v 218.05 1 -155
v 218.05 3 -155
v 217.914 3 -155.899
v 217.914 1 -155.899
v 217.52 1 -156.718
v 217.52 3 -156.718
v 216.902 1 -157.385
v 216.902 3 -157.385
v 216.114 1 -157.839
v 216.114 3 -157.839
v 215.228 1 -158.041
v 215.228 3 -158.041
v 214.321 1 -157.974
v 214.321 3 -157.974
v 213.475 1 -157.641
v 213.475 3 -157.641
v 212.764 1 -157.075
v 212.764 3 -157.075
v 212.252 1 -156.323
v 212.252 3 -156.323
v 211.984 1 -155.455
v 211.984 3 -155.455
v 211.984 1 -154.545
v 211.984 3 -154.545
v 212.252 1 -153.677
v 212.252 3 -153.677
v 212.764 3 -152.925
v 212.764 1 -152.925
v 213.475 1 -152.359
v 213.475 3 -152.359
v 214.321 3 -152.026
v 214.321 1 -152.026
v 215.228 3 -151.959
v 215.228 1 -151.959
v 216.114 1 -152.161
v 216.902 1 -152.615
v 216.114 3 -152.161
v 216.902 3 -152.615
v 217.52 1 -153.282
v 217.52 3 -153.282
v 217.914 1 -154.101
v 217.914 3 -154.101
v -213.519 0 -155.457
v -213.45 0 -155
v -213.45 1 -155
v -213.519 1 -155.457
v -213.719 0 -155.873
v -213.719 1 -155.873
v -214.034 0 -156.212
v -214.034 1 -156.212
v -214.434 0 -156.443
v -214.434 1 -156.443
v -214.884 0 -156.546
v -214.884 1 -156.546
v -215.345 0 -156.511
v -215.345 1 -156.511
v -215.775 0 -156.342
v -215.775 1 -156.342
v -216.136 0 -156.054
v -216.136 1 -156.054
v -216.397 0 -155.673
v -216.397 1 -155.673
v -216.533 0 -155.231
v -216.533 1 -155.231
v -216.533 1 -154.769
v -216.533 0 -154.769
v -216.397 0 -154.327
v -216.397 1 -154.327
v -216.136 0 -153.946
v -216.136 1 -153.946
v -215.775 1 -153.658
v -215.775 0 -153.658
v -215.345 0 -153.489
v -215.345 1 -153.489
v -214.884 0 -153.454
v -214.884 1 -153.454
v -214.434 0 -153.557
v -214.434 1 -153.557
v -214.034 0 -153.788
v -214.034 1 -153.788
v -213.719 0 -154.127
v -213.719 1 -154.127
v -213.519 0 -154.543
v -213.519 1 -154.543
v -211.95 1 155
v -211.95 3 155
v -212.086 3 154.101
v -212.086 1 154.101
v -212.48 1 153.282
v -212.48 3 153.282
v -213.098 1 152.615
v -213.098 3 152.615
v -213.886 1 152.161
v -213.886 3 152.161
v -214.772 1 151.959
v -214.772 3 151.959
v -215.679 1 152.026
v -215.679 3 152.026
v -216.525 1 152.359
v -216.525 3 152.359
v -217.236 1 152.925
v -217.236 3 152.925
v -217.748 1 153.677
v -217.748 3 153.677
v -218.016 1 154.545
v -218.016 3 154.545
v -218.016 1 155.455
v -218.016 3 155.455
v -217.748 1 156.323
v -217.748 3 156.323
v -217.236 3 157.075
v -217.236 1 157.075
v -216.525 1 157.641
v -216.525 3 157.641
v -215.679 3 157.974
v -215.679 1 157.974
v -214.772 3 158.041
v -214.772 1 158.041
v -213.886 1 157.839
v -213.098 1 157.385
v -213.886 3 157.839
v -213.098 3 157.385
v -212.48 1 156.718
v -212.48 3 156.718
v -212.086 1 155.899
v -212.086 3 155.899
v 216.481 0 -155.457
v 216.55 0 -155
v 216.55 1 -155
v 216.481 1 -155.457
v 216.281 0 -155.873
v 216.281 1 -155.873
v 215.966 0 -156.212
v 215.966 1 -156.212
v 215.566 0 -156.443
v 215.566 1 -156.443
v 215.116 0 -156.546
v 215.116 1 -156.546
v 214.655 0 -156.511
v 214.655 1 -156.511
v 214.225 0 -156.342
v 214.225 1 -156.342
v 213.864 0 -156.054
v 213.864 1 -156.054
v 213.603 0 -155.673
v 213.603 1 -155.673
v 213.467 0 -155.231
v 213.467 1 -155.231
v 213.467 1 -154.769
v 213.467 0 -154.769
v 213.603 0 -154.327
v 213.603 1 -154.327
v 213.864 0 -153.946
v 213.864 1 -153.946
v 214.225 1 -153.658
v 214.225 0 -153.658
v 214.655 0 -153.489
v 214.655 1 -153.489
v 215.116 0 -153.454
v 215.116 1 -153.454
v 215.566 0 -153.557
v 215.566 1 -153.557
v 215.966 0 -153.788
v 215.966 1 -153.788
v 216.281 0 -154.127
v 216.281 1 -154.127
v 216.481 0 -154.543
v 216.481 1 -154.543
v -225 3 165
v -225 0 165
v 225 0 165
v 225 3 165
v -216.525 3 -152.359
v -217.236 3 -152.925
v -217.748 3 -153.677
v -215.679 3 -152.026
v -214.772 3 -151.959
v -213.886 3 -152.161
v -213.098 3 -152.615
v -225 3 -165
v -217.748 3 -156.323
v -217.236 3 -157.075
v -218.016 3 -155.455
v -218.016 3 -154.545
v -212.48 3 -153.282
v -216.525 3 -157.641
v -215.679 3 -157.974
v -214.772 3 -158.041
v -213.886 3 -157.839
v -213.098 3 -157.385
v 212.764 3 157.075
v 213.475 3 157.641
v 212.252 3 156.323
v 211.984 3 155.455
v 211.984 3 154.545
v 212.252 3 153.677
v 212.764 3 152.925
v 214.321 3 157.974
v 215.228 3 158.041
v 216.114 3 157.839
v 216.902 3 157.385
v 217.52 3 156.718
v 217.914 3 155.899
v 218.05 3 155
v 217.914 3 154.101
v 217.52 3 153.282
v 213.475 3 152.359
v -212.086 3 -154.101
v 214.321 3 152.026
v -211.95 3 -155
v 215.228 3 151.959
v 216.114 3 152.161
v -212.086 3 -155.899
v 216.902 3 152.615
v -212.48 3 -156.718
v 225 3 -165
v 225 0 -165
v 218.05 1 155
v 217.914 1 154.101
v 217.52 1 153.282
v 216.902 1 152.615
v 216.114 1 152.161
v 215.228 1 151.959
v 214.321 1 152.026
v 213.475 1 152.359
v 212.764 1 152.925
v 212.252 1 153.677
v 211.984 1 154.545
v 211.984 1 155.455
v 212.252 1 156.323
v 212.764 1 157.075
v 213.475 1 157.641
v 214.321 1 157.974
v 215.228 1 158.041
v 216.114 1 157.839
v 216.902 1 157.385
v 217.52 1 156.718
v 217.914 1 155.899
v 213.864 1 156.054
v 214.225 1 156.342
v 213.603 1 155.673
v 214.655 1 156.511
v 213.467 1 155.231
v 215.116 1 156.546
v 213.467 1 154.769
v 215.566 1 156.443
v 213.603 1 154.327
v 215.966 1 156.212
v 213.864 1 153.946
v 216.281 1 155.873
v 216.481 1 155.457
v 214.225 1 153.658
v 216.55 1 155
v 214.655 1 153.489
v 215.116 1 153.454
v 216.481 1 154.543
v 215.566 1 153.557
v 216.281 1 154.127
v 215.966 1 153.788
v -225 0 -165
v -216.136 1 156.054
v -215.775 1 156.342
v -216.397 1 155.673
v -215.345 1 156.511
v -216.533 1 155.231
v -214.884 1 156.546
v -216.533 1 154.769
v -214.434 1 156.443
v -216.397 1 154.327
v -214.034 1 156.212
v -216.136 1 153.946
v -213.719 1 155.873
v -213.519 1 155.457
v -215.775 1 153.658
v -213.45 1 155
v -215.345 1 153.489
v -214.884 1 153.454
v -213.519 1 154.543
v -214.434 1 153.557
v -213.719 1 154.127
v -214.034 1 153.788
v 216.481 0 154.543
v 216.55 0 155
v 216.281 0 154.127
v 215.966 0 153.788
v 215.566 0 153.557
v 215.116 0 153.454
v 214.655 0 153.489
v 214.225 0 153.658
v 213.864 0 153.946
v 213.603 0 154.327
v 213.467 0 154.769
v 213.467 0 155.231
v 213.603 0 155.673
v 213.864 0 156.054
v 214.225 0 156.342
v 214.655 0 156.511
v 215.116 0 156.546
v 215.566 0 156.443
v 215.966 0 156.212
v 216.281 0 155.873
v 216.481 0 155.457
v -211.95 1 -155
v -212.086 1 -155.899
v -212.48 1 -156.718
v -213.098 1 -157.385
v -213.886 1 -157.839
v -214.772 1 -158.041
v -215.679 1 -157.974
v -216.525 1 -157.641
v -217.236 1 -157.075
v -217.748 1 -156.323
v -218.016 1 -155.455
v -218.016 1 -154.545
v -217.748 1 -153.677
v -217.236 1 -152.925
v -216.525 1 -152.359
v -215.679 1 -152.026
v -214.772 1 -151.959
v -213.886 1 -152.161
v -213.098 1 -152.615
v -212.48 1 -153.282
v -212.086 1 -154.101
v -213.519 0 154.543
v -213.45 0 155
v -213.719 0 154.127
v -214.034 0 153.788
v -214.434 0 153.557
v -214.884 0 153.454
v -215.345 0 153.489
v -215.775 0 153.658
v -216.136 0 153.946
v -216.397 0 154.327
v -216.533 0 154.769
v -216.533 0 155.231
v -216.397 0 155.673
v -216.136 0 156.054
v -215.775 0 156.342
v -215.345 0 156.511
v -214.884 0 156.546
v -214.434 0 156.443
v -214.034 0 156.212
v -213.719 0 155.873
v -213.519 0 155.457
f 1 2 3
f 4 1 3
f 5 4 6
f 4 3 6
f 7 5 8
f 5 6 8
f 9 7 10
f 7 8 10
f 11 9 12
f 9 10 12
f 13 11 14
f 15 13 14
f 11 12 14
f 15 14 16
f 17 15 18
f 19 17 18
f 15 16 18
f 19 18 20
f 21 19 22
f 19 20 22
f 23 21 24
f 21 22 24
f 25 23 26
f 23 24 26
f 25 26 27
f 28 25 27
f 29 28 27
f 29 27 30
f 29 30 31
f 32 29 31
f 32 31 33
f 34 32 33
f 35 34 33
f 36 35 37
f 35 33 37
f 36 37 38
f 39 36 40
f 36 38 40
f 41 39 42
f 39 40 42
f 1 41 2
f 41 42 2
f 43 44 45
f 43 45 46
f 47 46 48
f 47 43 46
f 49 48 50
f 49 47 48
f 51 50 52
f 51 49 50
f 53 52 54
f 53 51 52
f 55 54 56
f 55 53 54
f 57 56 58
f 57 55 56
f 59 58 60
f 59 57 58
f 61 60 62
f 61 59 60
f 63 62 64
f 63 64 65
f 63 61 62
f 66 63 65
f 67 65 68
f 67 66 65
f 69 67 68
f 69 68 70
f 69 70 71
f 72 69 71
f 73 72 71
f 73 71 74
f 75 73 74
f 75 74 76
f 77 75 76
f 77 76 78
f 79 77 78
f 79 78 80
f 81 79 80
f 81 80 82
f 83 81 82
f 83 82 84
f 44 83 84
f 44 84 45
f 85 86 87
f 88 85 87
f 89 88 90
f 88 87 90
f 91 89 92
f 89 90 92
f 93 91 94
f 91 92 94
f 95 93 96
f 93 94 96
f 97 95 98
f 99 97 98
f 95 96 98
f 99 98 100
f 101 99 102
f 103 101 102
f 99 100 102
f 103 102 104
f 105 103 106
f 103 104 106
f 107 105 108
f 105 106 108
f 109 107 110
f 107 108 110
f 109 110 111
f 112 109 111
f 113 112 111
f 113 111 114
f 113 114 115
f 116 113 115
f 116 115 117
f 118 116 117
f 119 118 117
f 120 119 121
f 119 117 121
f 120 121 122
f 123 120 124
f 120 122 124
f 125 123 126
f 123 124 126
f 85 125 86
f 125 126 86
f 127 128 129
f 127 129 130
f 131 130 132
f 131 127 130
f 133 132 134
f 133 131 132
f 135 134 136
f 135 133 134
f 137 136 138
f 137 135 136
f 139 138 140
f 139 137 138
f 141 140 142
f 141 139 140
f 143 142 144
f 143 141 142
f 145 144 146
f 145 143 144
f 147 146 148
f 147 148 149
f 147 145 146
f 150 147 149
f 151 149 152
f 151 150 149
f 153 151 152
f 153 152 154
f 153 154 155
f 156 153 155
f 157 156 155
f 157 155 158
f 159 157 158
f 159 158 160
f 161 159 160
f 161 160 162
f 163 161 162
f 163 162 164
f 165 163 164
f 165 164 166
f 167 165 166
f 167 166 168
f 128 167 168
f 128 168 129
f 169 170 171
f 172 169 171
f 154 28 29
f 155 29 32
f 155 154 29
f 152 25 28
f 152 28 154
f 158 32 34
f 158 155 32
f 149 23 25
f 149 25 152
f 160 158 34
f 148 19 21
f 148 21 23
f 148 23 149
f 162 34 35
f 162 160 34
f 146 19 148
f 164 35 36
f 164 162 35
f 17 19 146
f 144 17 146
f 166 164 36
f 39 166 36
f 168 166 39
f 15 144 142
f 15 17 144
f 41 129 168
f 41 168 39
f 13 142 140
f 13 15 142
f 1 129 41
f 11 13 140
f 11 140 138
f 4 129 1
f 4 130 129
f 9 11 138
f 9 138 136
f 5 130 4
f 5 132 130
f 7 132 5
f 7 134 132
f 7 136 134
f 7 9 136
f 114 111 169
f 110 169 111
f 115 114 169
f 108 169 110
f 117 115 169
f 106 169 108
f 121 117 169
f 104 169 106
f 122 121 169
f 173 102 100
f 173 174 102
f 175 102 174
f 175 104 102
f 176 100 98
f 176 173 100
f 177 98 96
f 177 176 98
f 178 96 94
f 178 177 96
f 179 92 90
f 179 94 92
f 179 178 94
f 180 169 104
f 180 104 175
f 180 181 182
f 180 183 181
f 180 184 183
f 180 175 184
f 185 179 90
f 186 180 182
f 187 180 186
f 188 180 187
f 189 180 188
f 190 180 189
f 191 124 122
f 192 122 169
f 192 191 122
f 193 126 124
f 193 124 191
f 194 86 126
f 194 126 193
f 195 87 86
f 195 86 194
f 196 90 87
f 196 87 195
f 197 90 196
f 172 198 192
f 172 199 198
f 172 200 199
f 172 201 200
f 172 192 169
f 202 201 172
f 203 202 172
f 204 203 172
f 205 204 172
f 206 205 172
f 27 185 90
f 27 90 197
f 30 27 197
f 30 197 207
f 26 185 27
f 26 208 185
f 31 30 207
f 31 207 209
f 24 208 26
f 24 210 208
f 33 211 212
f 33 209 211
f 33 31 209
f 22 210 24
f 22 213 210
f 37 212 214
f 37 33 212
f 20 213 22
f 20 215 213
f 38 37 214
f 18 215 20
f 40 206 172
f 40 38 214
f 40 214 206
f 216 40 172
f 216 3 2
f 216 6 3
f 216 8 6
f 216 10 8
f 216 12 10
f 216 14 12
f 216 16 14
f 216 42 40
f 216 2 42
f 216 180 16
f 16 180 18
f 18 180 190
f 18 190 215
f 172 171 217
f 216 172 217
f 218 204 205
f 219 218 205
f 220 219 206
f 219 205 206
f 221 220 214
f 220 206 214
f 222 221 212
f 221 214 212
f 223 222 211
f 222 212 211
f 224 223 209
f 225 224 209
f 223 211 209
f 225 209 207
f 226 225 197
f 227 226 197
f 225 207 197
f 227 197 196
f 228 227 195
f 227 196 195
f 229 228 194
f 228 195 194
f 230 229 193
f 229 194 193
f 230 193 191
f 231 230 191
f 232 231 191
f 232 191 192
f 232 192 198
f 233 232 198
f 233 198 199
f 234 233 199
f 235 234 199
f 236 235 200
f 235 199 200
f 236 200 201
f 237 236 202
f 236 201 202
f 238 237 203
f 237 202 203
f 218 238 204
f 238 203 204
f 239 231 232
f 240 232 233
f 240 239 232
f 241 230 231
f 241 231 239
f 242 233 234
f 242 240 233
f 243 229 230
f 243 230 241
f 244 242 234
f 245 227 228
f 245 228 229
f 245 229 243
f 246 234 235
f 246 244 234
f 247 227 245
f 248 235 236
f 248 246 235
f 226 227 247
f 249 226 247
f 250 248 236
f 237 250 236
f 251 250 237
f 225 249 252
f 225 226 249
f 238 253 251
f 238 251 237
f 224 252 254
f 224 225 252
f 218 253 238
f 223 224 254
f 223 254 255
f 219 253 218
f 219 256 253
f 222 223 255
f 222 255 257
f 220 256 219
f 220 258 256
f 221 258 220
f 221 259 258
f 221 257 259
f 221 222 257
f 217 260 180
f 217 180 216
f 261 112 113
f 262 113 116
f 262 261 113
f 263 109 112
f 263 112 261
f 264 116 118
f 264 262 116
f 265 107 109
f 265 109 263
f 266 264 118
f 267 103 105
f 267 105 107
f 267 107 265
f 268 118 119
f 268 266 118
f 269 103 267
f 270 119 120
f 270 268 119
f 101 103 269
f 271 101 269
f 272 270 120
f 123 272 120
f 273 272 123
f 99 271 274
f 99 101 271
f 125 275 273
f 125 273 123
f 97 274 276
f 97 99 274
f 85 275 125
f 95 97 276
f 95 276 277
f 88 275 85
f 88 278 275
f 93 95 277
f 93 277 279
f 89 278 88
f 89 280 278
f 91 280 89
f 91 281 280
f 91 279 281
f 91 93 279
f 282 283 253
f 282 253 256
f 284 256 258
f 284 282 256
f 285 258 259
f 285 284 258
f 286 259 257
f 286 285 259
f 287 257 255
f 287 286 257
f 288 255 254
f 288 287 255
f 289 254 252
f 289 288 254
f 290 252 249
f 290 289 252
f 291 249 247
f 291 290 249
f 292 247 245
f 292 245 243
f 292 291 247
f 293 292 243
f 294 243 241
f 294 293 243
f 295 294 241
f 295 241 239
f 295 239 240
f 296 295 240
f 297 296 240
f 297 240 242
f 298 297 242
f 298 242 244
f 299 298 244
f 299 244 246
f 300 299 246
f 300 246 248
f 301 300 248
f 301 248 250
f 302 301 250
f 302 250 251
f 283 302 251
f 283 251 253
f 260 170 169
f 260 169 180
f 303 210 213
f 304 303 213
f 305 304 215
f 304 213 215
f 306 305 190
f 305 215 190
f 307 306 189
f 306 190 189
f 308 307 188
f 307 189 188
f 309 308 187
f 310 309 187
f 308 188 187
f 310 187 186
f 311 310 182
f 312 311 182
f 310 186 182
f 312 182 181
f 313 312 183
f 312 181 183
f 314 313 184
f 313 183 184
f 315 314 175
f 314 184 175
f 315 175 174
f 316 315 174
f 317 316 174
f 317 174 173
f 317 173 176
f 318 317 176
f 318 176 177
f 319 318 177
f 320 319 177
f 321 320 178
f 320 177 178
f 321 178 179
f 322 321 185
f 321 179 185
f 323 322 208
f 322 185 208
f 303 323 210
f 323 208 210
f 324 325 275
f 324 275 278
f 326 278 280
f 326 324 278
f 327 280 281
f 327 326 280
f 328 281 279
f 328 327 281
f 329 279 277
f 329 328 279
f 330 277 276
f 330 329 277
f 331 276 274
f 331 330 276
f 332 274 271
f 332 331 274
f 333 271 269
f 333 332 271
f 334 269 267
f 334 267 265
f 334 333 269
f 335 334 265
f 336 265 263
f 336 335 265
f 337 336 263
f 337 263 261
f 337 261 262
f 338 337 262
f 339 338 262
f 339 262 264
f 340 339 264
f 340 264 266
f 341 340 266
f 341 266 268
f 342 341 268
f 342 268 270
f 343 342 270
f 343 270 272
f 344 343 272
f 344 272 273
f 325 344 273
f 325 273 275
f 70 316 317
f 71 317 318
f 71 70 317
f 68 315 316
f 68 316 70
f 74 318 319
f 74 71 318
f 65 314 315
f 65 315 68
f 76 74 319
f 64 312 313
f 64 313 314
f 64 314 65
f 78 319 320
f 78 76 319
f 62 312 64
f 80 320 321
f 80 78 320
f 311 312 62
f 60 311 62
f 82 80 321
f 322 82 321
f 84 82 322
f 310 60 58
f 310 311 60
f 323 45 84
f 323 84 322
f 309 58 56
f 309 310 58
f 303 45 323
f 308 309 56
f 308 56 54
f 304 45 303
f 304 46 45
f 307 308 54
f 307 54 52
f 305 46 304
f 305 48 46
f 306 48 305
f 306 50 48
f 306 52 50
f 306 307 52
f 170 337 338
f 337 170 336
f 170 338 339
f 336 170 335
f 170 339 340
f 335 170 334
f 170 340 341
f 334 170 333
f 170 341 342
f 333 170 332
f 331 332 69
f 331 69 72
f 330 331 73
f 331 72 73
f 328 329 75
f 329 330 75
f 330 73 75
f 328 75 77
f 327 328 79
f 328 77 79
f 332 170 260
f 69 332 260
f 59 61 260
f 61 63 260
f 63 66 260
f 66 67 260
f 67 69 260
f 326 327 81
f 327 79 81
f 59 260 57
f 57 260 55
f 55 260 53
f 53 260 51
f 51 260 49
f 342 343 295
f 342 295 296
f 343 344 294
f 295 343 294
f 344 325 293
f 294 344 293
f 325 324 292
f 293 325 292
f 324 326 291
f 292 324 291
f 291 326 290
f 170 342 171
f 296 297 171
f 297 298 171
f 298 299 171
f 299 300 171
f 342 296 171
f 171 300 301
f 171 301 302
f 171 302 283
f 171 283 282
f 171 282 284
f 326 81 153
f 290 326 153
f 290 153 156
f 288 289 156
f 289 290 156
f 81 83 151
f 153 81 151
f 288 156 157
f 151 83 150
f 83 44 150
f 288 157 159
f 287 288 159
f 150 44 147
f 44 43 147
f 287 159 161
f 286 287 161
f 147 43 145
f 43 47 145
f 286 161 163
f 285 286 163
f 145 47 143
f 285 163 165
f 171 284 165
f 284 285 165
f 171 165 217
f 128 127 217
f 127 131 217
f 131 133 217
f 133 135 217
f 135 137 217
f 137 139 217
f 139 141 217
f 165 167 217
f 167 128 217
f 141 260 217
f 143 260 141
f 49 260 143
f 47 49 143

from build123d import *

# Parameters (mm, degrees)
SKETCH1_W           = 450
SKETCH1_H           = 330
SKETCH1_R           = 3.05
SKETCH1_R_2         = 1.55
BOSS_EXTRUDE1_DEPTH = 3
CUT_EXTRUDE1_START  = 3
SKETCH1_3_R         = 3.05
SKETCH1_3_R_2       = 1.55
CUT_EXTRUDE1_DEPTH  = 2


with BuildPart() as part:
    # Sketch1 → Boss-Extrude1 (new body)
    with BuildSketch(Plane(origin=(0, 0, 0), x_dir=(1, 0, 0), z_dir=(0, 1, 0))):
        Rectangle(SKETCH1_W, SKETCH1_H)
        with Locations((215, -155)):
            Circle(SKETCH1_R, mode=Mode.SUBTRACT)
        with Locations((-215, 155)):
            Circle(SKETCH1_R, mode=Mode.SUBTRACT)
        with Locations((215, 155)):
            Circle(SKETCH1_R, mode=Mode.SUBTRACT)
        with Locations((-215, -155)):
            Circle(SKETCH1_R, mode=Mode.SUBTRACT)
        with Locations((-215, 155)):
            Circle(SKETCH1_R)
        with Locations((-215, 155)):
            Circle(SKETCH1_R_2, mode=Mode.SUBTRACT)
        with Locations((215, 155)):
            Circle(SKETCH1_R)
        with Locations((215, 155)):
            Circle(SKETCH1_R_2, mode=Mode.SUBTRACT)
        with Locations((215, -155)):
            Circle(SKETCH1_R)
        with Locations((215, -155)):
            Circle(SKETCH1_R_2, mode=Mode.SUBTRACT)
        with Locations((-215, -155)):
            Circle(SKETCH1_R)
        with Locations((-215, -155)):
            Circle(SKETCH1_R_2, mode=Mode.SUBTRACT)
    extrude(amount=BOSS_EXTRUDE1_DEPTH)

    # Sketch1<3> → Cut-Extrude1 (cut)
    with BuildSketch(Plane(origin=(0, 0, 0), x_dir=(1, 0, 0), z_dir=(0, 1, 0)).offset(CUT_EXTRUDE1_START)):
        with Locations((-215, -155)):
            Circle(SKETCH1_3_R)
        with Locations((-215, -155)):
            Circle(SKETCH1_3_R_2, mode=Mode.SUBTRACT)
        with Locations((-215, 155)):
            Circle(SKETCH1_3_R)
        with Locations((-215, 155)):
            Circle(SKETCH1_3_R_2, mode=Mode.SUBTRACT)
        with Locations((215, -155)):
            Circle(SKETCH1_3_R)
        with Locations((215, -155)):
            Circle(SKETCH1_3_R_2, mode=Mode.SUBTRACT)
        with Locations((215, 155)):
            Circle(SKETCH1_3_R)
        with Locations((215, 155)):
            Circle(SKETCH1_3_R_2, mode=Mode.SUBTRACT)
    extrude(amount=-CUT_EXTRUDE1_DEPTH, mode=Mode.SUBTRACT)


solid = part.part
